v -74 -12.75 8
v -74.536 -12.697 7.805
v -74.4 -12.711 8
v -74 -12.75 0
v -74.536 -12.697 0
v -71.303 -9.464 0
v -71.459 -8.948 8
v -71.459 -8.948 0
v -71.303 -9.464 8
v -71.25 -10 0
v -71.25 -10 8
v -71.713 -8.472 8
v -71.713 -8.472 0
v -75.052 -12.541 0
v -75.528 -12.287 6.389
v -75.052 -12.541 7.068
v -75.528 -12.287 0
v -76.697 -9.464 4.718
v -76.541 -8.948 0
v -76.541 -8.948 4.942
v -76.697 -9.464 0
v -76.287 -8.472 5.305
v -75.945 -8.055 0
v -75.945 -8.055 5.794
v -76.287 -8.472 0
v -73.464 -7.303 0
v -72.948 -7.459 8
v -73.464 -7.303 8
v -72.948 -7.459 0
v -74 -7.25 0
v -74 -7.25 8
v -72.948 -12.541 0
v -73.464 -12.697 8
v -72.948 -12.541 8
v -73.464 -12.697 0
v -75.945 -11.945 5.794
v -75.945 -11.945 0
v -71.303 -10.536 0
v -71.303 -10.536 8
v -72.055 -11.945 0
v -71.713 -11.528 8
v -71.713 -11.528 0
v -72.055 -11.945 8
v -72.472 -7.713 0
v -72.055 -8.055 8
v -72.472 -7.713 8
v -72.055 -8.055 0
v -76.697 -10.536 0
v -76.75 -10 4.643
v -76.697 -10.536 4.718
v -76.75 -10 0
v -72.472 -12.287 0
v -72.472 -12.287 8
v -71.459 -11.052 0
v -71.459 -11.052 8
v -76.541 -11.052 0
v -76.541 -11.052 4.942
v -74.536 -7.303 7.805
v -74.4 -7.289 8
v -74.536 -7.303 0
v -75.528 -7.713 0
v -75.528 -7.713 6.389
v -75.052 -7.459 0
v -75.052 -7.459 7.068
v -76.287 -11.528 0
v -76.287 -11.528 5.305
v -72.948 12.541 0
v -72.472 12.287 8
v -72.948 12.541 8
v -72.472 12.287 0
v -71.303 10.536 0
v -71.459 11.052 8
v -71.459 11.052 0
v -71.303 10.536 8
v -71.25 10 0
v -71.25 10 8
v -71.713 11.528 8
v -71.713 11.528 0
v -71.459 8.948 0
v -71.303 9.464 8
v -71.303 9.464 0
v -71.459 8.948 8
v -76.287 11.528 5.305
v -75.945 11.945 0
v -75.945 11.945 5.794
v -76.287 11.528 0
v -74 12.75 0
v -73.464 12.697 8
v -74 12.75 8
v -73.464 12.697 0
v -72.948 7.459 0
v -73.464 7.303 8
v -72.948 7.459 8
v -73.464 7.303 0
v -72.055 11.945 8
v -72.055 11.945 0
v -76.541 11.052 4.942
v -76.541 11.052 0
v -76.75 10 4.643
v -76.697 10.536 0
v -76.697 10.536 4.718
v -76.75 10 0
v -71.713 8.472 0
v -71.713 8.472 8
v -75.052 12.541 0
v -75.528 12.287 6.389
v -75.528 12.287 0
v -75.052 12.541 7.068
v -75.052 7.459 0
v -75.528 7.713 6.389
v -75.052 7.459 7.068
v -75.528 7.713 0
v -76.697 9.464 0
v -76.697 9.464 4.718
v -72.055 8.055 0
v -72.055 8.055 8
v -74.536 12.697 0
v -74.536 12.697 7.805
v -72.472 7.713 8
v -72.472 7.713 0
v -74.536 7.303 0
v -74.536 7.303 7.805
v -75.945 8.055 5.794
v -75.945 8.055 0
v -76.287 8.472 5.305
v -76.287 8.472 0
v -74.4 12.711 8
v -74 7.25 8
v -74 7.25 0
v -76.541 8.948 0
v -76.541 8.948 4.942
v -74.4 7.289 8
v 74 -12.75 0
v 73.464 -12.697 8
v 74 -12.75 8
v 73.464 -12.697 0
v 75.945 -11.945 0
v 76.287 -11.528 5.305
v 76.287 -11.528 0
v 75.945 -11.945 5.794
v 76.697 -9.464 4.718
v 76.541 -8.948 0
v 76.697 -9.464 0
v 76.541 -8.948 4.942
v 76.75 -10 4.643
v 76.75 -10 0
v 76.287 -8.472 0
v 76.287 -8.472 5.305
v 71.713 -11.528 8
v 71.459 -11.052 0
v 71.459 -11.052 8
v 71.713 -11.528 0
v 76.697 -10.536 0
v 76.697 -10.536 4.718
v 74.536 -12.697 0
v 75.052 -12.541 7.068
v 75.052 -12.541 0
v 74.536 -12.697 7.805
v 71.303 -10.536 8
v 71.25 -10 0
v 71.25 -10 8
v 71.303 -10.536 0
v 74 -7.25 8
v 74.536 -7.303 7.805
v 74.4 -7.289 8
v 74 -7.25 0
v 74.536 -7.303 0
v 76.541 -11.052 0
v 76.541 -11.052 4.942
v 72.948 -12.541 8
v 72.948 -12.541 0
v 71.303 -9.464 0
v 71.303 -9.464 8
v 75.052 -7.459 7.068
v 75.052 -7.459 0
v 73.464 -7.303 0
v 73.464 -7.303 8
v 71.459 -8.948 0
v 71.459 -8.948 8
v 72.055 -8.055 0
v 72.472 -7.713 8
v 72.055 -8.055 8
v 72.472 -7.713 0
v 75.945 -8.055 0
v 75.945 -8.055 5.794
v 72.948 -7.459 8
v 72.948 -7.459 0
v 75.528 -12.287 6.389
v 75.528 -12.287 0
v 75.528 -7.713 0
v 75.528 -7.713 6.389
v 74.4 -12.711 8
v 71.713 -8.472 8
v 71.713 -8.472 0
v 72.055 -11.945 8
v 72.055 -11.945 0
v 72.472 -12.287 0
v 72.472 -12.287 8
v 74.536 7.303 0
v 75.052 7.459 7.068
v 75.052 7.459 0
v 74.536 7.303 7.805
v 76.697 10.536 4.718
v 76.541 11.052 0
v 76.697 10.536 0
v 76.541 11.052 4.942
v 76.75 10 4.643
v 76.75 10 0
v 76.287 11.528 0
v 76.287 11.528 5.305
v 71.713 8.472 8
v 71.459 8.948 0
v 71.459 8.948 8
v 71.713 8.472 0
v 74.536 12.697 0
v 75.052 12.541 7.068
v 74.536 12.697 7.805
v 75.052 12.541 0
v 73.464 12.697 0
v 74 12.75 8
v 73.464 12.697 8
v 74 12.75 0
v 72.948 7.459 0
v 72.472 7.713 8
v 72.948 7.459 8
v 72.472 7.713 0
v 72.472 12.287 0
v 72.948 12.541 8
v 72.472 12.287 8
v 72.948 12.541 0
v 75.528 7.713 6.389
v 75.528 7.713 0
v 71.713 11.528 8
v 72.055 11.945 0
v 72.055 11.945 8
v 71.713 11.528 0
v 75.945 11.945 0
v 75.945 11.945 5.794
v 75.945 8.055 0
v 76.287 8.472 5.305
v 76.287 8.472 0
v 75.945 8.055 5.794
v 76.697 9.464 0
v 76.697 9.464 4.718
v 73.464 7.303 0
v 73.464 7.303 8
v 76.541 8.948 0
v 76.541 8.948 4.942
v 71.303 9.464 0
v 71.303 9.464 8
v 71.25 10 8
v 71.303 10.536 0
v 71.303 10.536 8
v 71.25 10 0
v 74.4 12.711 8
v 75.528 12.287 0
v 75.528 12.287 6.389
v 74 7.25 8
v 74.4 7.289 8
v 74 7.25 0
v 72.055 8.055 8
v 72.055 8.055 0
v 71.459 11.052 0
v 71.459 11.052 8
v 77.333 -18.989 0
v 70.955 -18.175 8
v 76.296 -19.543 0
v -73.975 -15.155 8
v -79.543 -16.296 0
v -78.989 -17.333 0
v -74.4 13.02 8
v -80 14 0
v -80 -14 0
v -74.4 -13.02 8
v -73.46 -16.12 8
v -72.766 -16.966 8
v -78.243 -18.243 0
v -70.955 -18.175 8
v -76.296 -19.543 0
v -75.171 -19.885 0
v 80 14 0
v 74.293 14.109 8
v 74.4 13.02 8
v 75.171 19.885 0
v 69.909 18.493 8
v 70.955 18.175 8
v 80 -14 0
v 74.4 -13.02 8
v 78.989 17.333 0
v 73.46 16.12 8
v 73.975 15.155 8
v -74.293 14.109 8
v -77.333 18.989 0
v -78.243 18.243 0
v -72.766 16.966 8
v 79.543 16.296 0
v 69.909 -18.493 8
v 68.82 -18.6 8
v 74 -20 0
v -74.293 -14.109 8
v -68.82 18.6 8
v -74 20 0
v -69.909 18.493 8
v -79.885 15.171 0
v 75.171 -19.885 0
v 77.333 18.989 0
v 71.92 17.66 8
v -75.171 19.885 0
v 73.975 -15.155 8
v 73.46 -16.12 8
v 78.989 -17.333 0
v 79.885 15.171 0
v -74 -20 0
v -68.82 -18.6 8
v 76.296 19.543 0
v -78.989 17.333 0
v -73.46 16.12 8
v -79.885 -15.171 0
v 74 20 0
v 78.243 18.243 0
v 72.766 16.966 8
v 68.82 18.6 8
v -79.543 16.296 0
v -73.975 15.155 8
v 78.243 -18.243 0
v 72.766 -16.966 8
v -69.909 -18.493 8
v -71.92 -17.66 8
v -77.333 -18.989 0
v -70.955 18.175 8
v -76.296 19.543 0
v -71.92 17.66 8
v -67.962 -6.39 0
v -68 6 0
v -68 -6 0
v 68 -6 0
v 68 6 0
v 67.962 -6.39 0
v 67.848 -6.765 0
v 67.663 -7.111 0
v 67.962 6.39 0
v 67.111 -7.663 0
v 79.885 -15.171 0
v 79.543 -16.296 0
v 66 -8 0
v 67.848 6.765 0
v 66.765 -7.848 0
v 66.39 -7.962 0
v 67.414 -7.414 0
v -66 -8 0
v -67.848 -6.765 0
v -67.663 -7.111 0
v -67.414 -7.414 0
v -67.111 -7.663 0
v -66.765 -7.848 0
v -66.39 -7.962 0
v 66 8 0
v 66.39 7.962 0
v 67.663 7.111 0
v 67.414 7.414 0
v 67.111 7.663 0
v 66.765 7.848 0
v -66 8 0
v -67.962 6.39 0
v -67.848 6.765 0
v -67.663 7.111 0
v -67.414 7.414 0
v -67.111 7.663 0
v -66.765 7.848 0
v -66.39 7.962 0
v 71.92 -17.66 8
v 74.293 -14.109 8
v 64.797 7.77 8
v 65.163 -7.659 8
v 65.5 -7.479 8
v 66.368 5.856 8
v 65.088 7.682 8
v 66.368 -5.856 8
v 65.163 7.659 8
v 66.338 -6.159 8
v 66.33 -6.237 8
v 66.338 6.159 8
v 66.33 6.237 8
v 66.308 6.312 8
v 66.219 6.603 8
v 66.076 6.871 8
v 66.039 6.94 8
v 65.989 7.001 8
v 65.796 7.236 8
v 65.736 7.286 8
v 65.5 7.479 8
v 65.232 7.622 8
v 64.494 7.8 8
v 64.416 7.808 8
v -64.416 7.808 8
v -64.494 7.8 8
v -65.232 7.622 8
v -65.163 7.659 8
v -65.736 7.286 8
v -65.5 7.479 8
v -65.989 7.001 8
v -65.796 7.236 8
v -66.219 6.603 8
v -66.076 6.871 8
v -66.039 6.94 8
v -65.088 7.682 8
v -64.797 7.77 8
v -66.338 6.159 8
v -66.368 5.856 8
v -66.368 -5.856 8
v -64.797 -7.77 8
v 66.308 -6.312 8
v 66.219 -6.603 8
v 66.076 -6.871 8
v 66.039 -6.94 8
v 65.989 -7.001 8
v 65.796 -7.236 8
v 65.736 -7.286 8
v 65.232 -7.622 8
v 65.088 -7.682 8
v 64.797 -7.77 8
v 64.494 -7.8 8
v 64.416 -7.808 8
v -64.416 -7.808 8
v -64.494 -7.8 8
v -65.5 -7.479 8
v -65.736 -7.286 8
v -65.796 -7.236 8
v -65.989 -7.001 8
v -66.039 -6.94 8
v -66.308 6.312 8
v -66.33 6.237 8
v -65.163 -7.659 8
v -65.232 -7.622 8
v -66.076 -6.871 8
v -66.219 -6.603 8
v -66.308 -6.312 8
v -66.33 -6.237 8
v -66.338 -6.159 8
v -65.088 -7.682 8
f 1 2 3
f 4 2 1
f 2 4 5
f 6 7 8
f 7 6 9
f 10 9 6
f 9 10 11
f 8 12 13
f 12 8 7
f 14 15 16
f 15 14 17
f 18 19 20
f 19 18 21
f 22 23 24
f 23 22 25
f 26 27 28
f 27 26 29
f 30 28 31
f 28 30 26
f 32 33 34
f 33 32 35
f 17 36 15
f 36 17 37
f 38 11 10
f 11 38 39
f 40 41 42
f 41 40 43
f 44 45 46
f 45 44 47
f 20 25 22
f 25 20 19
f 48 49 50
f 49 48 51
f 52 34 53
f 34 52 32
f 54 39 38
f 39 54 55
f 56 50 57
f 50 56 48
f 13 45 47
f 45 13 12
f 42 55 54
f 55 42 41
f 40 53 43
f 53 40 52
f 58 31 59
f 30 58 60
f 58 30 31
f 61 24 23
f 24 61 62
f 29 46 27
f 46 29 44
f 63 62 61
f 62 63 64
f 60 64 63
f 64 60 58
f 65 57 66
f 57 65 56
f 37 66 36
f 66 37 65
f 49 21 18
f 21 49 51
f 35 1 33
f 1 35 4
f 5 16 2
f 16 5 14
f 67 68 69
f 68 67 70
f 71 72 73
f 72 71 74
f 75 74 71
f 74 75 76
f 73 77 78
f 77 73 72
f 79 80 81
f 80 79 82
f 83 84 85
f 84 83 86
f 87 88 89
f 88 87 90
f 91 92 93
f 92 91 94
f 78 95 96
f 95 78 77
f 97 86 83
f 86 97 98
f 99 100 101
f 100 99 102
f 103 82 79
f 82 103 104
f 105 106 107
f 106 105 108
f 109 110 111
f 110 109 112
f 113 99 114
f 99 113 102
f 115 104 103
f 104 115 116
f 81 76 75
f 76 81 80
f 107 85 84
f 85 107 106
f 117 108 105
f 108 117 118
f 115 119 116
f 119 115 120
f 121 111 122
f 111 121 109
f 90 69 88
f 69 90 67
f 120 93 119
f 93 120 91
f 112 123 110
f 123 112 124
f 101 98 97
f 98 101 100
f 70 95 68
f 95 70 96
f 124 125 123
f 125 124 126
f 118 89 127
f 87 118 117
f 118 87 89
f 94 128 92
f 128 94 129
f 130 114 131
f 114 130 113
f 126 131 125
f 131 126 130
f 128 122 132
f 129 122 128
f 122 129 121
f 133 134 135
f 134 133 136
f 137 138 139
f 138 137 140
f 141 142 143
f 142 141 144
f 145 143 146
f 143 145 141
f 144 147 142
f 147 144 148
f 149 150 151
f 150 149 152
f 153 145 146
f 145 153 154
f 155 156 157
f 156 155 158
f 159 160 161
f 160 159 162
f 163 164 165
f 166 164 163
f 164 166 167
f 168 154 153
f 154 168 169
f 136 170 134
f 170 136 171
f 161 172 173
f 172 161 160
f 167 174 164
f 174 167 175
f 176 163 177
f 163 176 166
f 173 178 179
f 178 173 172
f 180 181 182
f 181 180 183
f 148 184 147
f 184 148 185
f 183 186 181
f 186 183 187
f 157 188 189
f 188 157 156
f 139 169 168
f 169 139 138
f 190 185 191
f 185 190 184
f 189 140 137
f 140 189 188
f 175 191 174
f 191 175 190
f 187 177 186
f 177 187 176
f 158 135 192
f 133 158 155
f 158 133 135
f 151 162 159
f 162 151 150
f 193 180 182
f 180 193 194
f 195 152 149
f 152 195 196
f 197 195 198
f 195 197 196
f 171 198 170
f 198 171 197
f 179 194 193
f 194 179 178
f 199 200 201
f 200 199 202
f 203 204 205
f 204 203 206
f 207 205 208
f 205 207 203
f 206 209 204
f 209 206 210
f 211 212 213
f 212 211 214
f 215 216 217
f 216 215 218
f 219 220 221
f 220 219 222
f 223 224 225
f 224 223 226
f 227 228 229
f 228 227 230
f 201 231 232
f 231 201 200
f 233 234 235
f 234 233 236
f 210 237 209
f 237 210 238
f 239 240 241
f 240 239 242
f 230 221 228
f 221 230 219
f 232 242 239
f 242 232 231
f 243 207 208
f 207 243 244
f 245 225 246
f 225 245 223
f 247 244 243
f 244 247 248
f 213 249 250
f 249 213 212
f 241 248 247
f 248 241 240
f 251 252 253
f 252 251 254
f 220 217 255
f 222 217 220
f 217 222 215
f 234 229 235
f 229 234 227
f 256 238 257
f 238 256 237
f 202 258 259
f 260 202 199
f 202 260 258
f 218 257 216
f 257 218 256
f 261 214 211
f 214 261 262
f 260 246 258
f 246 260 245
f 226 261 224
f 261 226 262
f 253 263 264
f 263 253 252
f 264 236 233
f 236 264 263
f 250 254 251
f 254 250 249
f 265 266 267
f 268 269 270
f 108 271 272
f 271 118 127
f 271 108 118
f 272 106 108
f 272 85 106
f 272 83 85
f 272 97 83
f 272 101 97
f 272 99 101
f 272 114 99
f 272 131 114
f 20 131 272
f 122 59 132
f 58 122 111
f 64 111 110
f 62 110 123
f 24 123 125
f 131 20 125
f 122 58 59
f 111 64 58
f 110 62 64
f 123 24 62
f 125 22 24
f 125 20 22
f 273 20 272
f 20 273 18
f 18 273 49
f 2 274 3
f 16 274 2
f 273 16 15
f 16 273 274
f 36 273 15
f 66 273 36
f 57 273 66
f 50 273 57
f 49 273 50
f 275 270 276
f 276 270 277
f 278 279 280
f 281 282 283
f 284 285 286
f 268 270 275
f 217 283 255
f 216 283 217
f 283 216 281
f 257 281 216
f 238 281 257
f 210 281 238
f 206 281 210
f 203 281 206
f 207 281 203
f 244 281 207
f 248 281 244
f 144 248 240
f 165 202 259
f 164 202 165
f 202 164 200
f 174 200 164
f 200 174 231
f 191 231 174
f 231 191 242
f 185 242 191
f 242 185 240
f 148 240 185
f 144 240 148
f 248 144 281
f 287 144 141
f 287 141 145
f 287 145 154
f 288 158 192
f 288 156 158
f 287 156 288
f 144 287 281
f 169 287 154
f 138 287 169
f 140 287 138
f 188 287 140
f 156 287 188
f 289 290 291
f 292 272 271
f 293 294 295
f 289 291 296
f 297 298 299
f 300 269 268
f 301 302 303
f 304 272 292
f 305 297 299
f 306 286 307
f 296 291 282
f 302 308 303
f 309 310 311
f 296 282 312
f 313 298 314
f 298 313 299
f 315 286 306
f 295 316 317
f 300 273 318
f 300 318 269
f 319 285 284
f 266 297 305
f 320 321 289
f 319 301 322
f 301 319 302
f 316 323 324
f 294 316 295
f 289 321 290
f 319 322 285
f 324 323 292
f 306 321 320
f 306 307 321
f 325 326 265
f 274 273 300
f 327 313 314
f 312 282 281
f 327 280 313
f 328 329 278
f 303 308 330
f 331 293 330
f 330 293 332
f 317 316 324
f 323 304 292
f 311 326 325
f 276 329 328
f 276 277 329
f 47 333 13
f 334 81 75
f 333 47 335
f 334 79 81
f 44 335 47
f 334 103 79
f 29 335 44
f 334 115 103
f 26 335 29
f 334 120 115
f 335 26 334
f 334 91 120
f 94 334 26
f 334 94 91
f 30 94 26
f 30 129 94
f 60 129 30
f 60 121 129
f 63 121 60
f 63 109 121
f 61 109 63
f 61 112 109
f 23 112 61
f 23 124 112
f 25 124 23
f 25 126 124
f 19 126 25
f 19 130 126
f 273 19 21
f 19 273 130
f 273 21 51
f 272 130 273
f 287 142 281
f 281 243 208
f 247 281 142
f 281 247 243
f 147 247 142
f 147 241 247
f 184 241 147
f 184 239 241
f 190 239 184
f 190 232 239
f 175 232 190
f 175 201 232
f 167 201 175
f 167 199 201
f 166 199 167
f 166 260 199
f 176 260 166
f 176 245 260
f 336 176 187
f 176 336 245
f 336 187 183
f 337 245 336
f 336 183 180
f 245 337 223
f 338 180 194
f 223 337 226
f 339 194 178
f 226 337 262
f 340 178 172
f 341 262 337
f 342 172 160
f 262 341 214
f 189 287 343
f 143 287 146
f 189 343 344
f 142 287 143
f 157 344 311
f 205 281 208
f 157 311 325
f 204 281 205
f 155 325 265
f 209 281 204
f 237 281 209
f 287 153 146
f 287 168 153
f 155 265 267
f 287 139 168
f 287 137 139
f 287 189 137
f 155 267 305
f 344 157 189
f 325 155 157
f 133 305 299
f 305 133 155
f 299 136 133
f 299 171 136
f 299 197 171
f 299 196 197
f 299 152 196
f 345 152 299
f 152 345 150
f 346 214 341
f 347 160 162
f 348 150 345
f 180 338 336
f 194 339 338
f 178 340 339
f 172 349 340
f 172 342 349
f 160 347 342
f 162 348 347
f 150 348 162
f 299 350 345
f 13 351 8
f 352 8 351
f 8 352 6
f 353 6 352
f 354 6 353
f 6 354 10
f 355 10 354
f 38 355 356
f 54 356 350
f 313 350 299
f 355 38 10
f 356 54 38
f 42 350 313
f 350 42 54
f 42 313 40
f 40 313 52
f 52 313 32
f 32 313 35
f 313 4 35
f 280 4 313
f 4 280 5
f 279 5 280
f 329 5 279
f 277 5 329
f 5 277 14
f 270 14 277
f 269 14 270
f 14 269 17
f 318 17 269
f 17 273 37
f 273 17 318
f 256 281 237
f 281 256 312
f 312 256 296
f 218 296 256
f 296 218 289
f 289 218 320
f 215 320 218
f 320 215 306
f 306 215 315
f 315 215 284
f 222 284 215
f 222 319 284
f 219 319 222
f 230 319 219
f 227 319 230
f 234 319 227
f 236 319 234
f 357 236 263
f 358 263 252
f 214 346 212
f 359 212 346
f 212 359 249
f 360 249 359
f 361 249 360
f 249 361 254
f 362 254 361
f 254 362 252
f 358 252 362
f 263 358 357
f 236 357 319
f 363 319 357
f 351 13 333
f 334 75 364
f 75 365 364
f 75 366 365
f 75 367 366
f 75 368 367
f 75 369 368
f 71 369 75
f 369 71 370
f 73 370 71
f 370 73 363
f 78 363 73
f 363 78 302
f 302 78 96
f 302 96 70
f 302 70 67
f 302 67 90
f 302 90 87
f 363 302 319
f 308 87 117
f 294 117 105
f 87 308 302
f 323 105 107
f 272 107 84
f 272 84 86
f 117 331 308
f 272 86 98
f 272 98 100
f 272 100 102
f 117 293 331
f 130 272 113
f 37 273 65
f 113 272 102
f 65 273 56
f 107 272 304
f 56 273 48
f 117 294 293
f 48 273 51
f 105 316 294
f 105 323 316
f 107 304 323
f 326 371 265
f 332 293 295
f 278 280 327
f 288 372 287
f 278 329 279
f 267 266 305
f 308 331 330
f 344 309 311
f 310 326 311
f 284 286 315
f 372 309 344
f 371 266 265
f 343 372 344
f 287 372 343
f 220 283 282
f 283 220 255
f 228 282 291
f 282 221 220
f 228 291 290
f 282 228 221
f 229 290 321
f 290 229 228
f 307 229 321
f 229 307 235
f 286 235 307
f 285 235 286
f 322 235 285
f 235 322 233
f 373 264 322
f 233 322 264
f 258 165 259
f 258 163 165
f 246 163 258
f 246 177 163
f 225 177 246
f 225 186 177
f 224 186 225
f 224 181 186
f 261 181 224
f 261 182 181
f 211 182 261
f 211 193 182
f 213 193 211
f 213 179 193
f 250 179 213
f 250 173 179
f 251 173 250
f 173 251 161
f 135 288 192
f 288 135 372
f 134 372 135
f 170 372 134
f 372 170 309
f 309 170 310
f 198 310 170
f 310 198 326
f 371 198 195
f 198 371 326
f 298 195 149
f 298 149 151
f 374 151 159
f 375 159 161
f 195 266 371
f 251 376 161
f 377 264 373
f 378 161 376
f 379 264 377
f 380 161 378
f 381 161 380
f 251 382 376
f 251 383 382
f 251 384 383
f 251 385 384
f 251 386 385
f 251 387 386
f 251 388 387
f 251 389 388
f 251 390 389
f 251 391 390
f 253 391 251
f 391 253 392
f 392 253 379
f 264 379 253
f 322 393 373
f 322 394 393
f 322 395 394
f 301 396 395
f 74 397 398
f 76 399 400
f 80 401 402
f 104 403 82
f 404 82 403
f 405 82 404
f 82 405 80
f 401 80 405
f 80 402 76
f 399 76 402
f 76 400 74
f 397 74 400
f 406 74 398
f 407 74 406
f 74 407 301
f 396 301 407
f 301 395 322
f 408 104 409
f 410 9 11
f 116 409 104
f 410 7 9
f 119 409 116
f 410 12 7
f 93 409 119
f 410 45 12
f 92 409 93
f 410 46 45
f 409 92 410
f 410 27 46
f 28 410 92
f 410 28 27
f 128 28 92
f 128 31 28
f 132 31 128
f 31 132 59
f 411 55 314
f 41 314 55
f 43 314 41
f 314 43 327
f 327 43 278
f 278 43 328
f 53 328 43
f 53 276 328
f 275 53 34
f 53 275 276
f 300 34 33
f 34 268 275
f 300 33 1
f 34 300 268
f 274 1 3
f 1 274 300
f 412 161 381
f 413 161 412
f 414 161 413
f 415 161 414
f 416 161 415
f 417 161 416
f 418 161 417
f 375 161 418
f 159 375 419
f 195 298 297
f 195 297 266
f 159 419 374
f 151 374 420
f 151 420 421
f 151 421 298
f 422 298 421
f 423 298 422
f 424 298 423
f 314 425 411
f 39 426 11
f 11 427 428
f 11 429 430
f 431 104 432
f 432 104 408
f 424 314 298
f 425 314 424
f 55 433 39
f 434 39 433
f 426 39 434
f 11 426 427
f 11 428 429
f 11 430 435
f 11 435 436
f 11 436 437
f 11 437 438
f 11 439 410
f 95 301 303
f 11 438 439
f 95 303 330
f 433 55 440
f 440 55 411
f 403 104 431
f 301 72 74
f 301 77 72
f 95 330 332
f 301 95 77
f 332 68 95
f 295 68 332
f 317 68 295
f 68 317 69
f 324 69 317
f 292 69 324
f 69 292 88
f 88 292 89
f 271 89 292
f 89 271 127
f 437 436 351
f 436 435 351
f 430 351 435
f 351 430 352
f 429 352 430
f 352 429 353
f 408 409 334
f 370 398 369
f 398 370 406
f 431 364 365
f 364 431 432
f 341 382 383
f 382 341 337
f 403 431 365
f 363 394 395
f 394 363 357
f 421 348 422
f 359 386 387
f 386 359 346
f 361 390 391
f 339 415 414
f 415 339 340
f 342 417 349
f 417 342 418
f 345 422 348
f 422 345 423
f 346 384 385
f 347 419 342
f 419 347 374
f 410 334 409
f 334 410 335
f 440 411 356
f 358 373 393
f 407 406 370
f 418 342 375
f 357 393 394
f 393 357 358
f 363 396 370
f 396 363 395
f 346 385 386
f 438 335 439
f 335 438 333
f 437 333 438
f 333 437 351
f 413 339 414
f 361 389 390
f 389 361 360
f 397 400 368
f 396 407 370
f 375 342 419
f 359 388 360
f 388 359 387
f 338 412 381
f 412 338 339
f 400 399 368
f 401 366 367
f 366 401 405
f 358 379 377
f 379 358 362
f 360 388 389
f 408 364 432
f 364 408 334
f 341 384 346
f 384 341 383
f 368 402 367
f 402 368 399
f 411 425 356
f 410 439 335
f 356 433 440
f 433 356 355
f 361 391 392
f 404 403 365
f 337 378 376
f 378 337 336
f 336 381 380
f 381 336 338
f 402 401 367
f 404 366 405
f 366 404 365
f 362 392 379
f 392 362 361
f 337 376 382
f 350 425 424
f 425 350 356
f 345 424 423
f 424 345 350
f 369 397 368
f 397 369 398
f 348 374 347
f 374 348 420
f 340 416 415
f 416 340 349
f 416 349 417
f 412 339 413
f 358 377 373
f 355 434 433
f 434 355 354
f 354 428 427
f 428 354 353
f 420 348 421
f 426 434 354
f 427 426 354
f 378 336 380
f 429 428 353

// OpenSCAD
$fn = 32;

// ----------------------------------------------------------------------
// Display bezel: 160 x 40 mm frame, opening 136x16 mm
// ----------------------------------------------------------------------

// --- parameters (mm) ---
length = 160;             // frame outside length, X
width = 40;               // frame outside width, Y
frame_w = 12;             // frame width
thickness = 8;            // frame thickness
corner_r = 6;             // outside corner radius
chamfer = 0.93;           // outer wall taper
funnel = 0.97;            // inner opening taper
opening_l = 136;          // opening length
opening_w = 16;           // opening width
inner_r = 2;              // opening corner radius
hole_d = 5.5;             // mounting screw clearance
holes_per_side = 2;       // holes per short side
hole_inset = 6;           // hole centre inset from the outside edge

/* rounded-rectangle outlines, generated with loops */
module rounded_ring(l_nom, w_nom, r) {
  hull() {
    for (sx = [-1, 1]) for (sy = [-1, 1])
      translate([sx * (l_nom / 2 - r), sy * (w_nom / 2 - r)]) circle(r = r);
  }
}

difference() {
  /* frame body, drafted so the outer edge is a variable-depth chamfer */
  linear_extrude(height = thickness, scale = chamfer)
    rounded_ring(length, width, corner_r);
  /* viewing opening, drafted the other way for a funnel edge */
  linear_extrude(height = thickness + 2, scale = funnel)
    translate([0, 0, -1]) rounded_ring(opening_l, opening_w, inner_r);
  /* mounting screws through the frame lands */
  for (sx = [-1, 1]) for (i = [1 : holes_per_side])
    translate([sx * (length / 2 - hole_inset),
               (i - (holes_per_side + 1) / 2) * width * 0.5, -1])
      cylinder(h = thickness + 2, d = hole_d);
}
